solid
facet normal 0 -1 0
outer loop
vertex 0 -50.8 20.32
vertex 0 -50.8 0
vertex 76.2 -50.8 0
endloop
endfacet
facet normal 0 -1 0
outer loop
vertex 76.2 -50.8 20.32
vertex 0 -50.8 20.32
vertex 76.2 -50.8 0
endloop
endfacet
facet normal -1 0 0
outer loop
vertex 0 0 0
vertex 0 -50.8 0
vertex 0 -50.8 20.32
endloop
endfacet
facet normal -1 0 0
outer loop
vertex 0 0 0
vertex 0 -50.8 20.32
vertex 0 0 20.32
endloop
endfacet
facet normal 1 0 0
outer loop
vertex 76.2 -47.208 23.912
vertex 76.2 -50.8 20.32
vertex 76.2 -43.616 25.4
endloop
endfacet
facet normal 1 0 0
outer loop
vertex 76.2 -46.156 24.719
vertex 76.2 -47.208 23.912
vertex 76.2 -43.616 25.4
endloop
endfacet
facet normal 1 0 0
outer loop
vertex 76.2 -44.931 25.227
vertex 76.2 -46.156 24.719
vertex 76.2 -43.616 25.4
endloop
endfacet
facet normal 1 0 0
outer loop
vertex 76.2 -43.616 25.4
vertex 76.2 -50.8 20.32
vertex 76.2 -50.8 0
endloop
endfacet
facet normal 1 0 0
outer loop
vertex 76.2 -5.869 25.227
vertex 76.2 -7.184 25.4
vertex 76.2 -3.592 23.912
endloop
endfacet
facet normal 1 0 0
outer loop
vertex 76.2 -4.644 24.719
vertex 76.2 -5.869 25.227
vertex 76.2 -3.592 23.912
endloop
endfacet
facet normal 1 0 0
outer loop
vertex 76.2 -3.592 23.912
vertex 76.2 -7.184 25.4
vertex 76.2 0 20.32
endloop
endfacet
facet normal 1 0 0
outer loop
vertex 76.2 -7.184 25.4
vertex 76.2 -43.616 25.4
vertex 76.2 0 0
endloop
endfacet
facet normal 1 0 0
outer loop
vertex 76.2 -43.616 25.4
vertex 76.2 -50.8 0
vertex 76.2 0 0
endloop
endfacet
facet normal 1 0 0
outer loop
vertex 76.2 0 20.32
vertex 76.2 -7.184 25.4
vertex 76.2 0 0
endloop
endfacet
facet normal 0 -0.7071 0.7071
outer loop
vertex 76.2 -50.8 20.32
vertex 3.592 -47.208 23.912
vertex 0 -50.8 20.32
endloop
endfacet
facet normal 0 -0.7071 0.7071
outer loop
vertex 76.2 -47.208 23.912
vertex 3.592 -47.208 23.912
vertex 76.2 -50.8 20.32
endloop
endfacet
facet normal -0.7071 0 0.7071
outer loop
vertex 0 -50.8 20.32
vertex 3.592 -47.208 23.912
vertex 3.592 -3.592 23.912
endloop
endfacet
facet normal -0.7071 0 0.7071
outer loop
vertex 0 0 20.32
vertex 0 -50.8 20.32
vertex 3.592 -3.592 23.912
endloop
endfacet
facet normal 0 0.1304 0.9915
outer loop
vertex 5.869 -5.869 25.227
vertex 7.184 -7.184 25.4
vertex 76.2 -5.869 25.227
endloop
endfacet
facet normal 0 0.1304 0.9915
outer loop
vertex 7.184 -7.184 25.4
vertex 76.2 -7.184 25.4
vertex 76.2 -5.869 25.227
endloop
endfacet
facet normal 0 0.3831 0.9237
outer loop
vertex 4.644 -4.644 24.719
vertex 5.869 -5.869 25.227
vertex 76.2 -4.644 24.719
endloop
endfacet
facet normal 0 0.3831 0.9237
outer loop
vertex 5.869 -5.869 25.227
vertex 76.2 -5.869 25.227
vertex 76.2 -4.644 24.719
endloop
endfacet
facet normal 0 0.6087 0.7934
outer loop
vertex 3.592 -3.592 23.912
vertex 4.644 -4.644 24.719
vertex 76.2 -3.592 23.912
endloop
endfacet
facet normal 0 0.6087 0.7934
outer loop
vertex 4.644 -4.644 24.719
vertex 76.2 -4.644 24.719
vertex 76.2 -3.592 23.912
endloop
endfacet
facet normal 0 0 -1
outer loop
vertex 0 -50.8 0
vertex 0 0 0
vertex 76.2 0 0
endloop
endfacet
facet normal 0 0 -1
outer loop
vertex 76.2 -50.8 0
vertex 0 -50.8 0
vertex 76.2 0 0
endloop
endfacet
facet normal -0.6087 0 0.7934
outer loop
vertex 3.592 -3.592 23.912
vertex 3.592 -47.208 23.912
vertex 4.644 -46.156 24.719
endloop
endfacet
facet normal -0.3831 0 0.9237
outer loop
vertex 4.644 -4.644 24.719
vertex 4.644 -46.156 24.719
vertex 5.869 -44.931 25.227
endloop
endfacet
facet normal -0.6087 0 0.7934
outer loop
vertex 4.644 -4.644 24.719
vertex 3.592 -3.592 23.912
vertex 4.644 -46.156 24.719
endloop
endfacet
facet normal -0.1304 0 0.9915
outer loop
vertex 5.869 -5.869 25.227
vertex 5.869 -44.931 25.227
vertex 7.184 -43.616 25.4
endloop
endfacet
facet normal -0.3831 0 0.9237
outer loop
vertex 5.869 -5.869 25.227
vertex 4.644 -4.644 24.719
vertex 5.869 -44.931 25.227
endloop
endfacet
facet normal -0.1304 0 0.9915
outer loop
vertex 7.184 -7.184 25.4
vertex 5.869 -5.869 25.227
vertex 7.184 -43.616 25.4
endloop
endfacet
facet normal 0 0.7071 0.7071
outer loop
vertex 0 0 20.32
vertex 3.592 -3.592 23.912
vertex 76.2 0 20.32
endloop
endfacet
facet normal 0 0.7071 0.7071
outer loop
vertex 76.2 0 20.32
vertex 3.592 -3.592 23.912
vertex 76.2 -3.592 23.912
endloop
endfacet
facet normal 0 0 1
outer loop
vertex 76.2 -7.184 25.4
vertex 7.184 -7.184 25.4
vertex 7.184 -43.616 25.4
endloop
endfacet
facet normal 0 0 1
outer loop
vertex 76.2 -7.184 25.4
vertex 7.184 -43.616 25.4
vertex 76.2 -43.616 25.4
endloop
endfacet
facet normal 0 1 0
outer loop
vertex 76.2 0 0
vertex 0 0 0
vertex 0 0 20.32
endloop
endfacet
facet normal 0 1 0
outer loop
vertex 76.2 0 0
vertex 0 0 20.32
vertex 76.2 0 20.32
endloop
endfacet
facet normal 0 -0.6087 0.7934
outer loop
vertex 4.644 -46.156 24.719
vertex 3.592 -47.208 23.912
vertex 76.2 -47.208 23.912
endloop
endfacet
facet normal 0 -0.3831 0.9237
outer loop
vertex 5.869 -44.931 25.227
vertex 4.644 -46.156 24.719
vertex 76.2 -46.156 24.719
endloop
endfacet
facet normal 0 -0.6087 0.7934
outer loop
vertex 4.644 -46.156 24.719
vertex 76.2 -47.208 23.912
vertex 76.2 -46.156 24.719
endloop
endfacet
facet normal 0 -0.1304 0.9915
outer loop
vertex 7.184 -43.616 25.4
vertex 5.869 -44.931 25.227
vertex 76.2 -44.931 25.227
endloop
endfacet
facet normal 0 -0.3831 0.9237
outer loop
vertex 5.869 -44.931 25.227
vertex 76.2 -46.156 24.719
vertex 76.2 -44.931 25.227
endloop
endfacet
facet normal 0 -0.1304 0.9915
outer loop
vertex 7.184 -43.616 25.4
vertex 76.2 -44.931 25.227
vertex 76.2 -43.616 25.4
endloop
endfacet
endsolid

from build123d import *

# Parameters (mm, degrees)
F0_W     = 76.2
F0_H     = 50.8
F1_DEPTH = 25.4
F2_SIZE  = 5.08
F3_R     = 5.08


with BuildPart() as f1:
    # F0 (on Top) → F1 (new body)
    with BuildSketch(Plane.XY):
        with Locations((38.1, -25.4)):
            Rectangle(F0_W, F0_H)
    extrude(amount=F1_DEPTH)

    # F2
    f2_edges = [f1.edges().sort_by_distance(p)[0] for p in [
        (38.1, -50.8, 25.4),
        (0, -25.4, 25.4),
        (38.1, 0, 25.4),
    ]]
    chamfer(f2_edges, length=F2_SIZE)

    # F3
    f3_edges = [f1.edges().sort_by_distance(p)[0] for p in [
        (40.64, -5.08, 25.4),
        (5.08, -25.4, 25.4),
        (40.64, -45.72, 25.4),
    ]]
    fillet(f3_edges, radius=F3_R)


solid = f1.part
